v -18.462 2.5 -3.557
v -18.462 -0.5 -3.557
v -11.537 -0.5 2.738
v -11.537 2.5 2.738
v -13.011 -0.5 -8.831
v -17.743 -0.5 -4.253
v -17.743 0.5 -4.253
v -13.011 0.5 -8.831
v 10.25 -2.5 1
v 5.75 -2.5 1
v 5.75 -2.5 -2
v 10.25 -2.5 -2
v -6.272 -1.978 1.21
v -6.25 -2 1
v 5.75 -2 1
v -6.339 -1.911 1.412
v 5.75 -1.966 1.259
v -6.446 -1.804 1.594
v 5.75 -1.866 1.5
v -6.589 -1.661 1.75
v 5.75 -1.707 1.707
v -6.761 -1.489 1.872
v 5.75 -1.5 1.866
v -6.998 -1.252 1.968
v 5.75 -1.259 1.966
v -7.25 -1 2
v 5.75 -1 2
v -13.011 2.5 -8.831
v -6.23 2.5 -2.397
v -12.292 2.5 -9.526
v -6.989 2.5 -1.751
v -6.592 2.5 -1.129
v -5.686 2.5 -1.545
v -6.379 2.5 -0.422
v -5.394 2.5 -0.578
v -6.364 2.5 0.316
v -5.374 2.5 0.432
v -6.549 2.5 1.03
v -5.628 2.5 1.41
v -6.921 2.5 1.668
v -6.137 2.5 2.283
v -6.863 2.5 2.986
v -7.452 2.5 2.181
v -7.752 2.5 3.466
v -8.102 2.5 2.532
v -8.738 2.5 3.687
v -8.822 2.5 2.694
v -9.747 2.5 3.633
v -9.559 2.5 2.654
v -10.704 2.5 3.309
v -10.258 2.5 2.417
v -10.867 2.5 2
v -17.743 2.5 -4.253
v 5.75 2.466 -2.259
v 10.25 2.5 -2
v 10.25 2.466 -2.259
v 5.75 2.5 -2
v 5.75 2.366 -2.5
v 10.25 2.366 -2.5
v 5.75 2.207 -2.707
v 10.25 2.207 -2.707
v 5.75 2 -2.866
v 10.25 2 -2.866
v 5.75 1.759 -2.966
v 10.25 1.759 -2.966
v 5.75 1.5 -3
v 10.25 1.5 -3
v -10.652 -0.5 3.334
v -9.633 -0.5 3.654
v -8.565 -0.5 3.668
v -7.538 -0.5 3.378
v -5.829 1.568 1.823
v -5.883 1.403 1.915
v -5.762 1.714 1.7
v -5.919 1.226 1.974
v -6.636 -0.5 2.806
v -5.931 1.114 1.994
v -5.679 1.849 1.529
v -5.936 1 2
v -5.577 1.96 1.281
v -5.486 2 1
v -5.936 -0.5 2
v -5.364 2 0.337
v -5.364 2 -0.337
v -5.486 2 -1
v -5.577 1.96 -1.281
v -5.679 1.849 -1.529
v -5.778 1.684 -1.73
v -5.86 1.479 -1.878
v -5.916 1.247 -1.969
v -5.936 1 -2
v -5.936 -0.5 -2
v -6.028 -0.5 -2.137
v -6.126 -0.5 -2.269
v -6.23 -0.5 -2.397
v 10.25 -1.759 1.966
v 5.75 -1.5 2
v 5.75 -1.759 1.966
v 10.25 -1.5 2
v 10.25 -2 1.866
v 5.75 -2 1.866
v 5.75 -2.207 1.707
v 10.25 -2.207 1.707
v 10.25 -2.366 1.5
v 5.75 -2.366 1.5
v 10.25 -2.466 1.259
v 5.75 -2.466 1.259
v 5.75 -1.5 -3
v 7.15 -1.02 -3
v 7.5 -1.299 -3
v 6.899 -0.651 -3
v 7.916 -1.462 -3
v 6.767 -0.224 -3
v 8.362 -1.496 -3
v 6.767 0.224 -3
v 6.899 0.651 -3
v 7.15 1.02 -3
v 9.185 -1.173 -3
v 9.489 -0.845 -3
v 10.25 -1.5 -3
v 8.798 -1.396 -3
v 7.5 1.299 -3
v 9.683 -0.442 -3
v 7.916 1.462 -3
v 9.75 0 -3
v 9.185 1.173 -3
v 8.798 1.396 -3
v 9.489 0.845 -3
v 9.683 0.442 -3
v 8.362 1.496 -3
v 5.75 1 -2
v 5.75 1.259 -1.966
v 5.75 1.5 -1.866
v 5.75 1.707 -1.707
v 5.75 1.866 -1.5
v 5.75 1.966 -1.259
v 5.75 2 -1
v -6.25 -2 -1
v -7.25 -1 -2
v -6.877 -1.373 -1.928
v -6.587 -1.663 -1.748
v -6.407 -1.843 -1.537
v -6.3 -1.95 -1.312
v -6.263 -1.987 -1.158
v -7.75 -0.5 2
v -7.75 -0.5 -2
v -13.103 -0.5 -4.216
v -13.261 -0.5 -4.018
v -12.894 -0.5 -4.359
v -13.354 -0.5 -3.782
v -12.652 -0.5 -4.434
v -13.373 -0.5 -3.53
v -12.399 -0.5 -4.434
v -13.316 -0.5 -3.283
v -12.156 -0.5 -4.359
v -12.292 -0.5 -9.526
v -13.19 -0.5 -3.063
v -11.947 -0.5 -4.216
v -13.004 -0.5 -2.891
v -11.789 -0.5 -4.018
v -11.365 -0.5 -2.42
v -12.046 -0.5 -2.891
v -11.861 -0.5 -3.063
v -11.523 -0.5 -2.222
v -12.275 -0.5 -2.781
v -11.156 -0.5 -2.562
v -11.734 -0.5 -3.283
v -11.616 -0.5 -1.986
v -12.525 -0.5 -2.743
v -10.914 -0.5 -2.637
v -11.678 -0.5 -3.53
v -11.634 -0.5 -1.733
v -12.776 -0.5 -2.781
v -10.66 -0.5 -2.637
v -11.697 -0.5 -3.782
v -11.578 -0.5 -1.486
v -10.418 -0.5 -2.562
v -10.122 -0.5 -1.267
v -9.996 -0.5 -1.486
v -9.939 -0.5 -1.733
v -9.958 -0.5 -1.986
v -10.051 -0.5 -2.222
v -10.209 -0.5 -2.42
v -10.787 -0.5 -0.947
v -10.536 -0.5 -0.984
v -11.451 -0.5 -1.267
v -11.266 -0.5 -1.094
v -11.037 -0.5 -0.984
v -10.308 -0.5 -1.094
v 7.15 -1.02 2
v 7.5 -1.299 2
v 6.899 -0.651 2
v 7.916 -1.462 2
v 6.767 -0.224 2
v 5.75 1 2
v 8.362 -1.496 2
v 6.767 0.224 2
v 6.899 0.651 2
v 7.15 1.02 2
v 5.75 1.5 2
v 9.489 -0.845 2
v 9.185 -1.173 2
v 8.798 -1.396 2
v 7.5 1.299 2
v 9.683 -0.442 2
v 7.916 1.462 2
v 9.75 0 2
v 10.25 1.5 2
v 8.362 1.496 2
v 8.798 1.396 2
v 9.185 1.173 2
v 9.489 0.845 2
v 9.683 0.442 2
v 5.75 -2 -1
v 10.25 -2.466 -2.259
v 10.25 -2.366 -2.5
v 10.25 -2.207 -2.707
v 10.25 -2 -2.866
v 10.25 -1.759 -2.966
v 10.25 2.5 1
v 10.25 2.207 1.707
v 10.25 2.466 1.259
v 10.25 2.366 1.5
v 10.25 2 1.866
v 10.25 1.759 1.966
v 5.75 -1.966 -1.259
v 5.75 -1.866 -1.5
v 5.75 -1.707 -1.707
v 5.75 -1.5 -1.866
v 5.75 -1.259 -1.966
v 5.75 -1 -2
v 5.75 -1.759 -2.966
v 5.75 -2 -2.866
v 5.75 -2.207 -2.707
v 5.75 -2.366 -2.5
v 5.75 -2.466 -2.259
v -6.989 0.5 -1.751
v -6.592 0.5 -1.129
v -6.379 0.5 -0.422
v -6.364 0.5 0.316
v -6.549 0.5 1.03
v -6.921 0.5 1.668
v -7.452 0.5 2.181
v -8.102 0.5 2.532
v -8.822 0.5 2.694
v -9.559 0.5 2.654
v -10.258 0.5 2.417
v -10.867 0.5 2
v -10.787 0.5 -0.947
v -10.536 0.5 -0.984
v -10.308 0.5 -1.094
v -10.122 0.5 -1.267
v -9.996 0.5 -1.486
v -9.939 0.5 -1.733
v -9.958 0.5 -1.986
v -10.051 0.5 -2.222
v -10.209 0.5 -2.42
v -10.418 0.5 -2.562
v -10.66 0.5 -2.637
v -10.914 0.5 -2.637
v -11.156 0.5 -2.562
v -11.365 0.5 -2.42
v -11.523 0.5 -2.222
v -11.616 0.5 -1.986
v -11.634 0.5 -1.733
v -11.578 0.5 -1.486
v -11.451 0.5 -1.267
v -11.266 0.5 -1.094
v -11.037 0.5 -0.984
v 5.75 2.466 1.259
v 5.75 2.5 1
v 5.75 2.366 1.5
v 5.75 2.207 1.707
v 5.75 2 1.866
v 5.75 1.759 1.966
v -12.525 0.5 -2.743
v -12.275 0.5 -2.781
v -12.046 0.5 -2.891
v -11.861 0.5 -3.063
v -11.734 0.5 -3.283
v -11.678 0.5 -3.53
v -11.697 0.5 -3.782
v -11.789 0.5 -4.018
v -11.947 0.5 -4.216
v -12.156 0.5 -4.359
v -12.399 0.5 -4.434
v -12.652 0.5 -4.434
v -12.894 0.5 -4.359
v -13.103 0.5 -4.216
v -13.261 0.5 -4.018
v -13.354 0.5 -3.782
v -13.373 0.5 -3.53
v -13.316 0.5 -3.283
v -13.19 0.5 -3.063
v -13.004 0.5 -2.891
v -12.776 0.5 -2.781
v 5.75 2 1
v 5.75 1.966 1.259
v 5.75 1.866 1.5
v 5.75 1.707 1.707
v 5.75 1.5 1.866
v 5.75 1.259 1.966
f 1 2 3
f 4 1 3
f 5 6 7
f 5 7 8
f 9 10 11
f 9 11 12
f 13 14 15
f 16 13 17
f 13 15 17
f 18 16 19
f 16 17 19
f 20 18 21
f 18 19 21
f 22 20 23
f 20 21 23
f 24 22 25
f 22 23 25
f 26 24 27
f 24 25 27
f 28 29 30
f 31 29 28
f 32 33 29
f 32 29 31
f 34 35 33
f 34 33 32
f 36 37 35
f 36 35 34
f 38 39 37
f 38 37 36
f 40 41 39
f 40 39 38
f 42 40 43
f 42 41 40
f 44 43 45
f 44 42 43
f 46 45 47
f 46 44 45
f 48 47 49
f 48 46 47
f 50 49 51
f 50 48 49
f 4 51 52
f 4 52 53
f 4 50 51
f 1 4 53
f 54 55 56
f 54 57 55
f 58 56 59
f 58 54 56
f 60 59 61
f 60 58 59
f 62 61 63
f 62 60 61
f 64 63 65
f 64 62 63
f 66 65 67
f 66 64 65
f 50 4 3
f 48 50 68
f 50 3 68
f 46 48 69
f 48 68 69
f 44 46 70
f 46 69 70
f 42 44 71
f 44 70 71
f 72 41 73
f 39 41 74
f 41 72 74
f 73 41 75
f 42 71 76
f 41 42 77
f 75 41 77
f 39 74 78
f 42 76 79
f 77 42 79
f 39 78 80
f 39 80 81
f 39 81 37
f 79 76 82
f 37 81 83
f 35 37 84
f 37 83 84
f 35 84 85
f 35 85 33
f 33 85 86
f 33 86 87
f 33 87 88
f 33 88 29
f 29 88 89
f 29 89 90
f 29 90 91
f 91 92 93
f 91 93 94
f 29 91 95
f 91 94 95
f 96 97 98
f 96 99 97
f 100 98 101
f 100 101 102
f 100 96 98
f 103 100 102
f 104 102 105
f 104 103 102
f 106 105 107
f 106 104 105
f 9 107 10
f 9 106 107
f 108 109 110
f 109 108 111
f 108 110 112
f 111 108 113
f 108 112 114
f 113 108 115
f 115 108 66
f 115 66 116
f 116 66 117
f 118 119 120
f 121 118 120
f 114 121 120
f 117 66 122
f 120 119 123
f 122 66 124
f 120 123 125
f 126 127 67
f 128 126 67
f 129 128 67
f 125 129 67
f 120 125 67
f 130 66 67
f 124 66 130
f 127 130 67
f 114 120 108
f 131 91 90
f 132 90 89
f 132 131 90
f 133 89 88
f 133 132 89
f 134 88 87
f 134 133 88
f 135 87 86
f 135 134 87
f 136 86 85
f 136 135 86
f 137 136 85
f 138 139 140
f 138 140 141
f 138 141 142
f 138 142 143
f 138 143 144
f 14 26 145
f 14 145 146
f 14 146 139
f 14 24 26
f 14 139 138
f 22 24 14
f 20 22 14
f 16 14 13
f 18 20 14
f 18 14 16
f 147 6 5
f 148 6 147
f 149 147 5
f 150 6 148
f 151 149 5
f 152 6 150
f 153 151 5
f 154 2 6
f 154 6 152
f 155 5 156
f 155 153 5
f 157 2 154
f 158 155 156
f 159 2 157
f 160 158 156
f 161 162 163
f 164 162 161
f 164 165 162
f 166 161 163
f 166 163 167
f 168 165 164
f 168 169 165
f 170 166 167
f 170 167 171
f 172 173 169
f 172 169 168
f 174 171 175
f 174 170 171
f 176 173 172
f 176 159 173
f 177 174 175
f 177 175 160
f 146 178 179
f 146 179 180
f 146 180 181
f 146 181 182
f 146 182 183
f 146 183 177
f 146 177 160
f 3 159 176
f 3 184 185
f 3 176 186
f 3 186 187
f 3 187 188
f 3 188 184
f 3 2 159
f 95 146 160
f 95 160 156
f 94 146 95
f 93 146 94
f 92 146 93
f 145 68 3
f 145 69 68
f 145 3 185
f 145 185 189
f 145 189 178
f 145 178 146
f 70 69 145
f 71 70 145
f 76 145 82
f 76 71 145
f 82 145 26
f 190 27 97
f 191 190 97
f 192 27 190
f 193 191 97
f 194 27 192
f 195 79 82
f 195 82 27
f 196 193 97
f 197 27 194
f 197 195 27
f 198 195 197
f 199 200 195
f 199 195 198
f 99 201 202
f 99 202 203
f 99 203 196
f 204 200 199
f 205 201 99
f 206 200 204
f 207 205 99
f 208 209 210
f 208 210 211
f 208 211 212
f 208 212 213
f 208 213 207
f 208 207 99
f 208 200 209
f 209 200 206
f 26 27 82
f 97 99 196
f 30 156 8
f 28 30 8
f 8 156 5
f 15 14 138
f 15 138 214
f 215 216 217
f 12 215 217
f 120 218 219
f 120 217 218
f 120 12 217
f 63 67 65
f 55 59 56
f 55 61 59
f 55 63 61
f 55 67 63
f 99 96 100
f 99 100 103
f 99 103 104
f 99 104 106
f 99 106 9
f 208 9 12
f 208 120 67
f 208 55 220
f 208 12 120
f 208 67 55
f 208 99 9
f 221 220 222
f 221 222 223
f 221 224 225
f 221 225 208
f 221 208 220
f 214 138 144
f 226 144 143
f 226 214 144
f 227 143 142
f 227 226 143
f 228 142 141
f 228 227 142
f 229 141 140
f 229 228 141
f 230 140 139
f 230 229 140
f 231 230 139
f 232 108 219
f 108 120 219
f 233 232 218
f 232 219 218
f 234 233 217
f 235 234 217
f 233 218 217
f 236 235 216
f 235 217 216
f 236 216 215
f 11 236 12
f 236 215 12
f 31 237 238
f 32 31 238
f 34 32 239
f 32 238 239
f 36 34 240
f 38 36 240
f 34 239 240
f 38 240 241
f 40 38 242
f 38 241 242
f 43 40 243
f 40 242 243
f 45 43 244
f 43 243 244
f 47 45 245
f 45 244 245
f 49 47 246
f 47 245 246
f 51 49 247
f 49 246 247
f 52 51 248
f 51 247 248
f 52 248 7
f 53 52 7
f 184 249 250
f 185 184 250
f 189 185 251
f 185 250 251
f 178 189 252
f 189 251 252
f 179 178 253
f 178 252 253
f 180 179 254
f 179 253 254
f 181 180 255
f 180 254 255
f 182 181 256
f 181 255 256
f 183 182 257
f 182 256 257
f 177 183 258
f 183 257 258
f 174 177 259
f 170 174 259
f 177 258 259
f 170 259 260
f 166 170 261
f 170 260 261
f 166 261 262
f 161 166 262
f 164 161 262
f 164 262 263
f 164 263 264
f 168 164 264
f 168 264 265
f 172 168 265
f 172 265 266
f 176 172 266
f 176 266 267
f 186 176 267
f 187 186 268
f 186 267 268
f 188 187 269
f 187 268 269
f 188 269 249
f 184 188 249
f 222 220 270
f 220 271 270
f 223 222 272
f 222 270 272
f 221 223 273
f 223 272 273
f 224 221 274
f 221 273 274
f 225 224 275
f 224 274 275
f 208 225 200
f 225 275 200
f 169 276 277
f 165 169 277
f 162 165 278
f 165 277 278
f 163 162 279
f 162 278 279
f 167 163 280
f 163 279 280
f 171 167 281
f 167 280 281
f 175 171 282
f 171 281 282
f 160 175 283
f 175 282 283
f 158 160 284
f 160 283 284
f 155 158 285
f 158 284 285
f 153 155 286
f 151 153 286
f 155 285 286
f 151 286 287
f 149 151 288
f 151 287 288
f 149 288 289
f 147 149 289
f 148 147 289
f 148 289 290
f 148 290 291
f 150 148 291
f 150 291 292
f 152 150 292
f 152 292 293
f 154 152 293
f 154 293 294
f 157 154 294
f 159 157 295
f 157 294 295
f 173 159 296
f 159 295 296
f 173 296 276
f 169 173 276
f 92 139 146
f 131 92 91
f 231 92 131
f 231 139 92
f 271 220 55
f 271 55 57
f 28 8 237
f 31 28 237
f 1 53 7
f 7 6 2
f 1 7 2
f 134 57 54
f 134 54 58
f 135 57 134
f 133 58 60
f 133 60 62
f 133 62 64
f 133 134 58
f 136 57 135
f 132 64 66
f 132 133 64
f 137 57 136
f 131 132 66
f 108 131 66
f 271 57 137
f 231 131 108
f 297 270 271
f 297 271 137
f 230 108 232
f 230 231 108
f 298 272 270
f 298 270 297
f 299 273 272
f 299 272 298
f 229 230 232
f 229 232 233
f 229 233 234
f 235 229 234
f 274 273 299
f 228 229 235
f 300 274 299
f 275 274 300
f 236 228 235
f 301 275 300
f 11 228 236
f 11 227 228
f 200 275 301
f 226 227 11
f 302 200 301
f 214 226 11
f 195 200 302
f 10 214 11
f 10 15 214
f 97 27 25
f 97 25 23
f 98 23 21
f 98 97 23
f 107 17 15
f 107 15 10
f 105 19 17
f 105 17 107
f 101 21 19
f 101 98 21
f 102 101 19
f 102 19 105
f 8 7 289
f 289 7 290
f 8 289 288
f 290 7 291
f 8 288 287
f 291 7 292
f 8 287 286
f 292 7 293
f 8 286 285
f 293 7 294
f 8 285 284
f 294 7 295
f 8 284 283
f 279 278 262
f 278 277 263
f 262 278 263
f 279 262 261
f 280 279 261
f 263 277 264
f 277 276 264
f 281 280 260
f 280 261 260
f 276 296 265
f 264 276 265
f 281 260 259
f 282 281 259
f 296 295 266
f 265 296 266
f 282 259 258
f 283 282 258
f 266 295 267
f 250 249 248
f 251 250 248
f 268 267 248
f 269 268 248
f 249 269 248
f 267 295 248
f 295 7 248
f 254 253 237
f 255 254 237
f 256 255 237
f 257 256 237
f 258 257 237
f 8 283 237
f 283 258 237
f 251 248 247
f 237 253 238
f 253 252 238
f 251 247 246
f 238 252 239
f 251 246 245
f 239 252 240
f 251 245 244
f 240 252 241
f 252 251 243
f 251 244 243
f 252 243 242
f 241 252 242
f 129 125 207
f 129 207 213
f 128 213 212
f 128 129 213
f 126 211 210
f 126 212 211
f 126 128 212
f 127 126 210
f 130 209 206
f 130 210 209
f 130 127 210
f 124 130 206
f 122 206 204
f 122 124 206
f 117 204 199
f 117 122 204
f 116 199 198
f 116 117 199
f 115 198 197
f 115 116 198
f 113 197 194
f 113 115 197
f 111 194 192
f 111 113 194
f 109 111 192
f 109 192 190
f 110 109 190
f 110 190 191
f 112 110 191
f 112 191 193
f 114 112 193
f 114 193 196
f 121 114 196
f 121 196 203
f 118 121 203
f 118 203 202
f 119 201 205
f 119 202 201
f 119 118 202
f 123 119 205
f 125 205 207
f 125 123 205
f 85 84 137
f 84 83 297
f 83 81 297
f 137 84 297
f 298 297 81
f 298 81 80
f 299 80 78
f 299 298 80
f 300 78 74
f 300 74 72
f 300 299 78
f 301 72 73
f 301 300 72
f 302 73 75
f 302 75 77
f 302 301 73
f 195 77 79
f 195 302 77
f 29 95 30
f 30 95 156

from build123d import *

# Parameters (mm, degrees)
SKETCH_1_W                = 20.5
SKETCH_1_H                = 4
EXTRUDE_1_DEPTH           = 2
SKETCH_2_R                = 0.85
CUT_EXTRUDE_1_DEPTH       = 13
SKETCH_3_R                = 0.8
CUT_EXTRUDE_2_DEPTH       = 3
FILLET_1_R                = 1
SKETCH_4_W                = 4
SKETCH_4_H                = 4
CUT_EXTRUDE_5_DEPTH       = 1.5
CUT_EXTRUDE_6_DEPTH       = 1.5
SKETCH_7_W                = 1
SKETCH_7_H                = 4
EXTRUDE_2_DEPTH           = 1
FILLET_2_R                = 1
EXTRUDE_3_DEPTH           = 3
CUT_EXTRUDE_7_DEPTH       = 3
EXTRUDE_4_DEPTH           = 1
SKETCH_10_R               = 0.85
CUT_EXTRUDE_8_DEPTH       = 1
EXTRUDE_5_REACH           = 23.907
CUT_EXTRUDE_9_DEPTH       = 20.215826188
EXTRUDE_6_DEPTH           = 5
CUT_EXTRUDE_10_DEPTH      = 22.907341564
CUT_EXTRUDE_10_DEPTH_BACK = 22.907341564
SKETCH_14_R               = 1.5
FILLET_3_R                = 1


with BuildPart() as part:
    # 草图1 → 凸台-拉伸1 (new, symmetric)
    with BuildSketch(Plane.XY):
        Rectangle(SKETCH_1_W, SKETCH_1_H)
    extrude(amount=EXTRUDE_1_DEPTH, both=True)

    # 草图2 → 切除-拉伸1 (cut)
    with BuildSketch(Plane.XZ.offset(2)):
        with Locations(Location((-9.048459148, 0, 0), (0, 0, 270))):
            Circle(SKETCH_2_R)
    extrude(amount=-CUT_EXTRUDE_1_DEPTH, mode=Mode.SUBTRACT)

    # 草图3 → 切除-拉伸2 (cut)
    with BuildSketch(Plane.XY.offset(2)):
        with Locations((8.25, 0)):
            Circle(SKETCH_3_R)
    extrude(amount=-CUT_EXTRUDE_2_DEPTH, mode=Mode.SUBTRACT)

    # 圆角1
    fillet_1_edges = [part.edges().sort_by_distance(p)[0] for p in [
        (0, -2, 2),
        (0, -2, -2),
        (0, 2, -2),
        (0, 2, 2),
    ]]
    fillet(fillet_1_edges, radius=FILLET_1_R)

    # 草图4 → 切除-拉伸5 (cut)
    with BuildSketch(Plane.XZ.offset(2)):
        with Locations((-8.25, 0)):
            Rectangle(SKETCH_4_W, SKETCH_4_H)
    extrude(amount=-CUT_EXTRUDE_5_DEPTH, mode=Mode.SUBTRACT)

    # 草图5 → 切除-拉伸6 (cut)
    with BuildSketch(Plane(origin=(0, 2, 0), x_dir=(1, 0, 0), z_dir=(0, 1, 0))):
        Polygon((-6.25, 0), (-6.25, 2), (-10.25, 2), (-10.25, -2), (-6.25, -2), align=None)
    extrude(amount=-CUT_EXTRUDE_6_DEPTH, mode=Mode.SUBTRACT)

    # 草图7 → 凸台-拉伸2 (add)
    with BuildSketch(Plane.XZ.offset(0.5)):
        with Locations((-10.75, 0)):
            Rectangle(SKETCH_7_W, SKETCH_7_H)
    extrude(amount=-EXTRUDE_2_DEPTH)

    # 圆角2
    fillet_2_edges = [part.edges().sort_by_distance(p)[0] for p in [
        (-11.25, 0, 2),
        (-11.25, 0, -2),
    ]]
    fillet(fillet_2_edges, radius=FILLET_2_R)

    # 草图8 → 凸台-拉伸3 (add)
    with BuildSketch(Plane.XZ.offset(0.5)):
        with BuildLine():
            Line((-13.011033862, -8.830832343), (-6.991216755, -1.748643399))
            ThreePointArc((-6.991216755, -1.748643399), (-7.171159983, 1.940553489), (-10.864293035, 1.998186001))
            Line((-10.864293035, 1.998186001), (-17.742872996, -4.252662808))
            Line((-17.742872996, -4.252662808), (-18.461553282, -3.557322138))
            Line((-18.461553282, -3.557322138), (-11.537428317, 2.737705696))
            ThreePointArc((-11.537428317, 2.737705696), (-6.475862877, 2.659275921), (-6.229806023, -2.396913549))
            Line((-6.229806023, -2.396913549), (-12.292353576, -9.526173013))
            Line((-12.292353576, -9.526173013), (-13.011033862, -8.830832343))
        make_face()
    extrude(amount=-EXTRUDE_3_DEPTH)

    # 草图9 → 切除-拉伸7 (cut)
    with BuildSketch(Plane.XZ.offset(0.5)):
        with BuildLine():
            Line((-13.011033862, -8.830832343), (-6.989420262, -1.751365983))
            ThreePointArc((-6.989420262, -1.751365983), (-7.168982159, 1.942804723), (-10.867073667, 1.999891291))
            Line((-10.867073667, 1.999891291), (-17.742872996, -4.252662808))
            Line((-17.742872996, -4.252662808), (-13.011033862, -8.830832343))
        make_face()
    extrude(amount=-CUT_EXTRUDE_7_DEPTH, mode=Mode.SUBTRACT)

    # 草图9<2> → 凸台-拉伸4 (add)
    with BuildSketch(Plane.XZ.offset(0.5)):
        with BuildLine():
            Line((-13.011033862, -8.830832343), (-6.989420262, -1.751365983))
            ThreePointArc((-6.989420262, -1.751365983), (-7.168982159, 1.942804723), (-10.867073667, 1.999891291))
            Line((-10.867073667, 1.999891291), (-17.742872996, -4.252662808))
            Line((-17.742872996, -4.252662808), (-13.011033862, -8.830832343))
        make_face()
    extrude(amount=-EXTRUDE_4_DEPTH)

    # 草图10 → 切除-拉伸8 (cut)
    with BuildSketch(Plane(origin=(0, 0.5, 0), x_dir=(1, 0, 0), z_dir=(0, 1, 0))):
        with Locations(Location((-10.786836392, 1.796675975, 0), (0, 0, 270))):
            Circle(SKETCH_10_R)
        with Locations(Location((-12.525213635, 3.59335195, 0), (0, 0, 270))):
            Circle(SKETCH_10_R)
    extrude(amount=-CUT_EXTRUDE_8_DEPTH, mode=Mode.SUBTRACT)

    # 凸台-拉伸5: up to this face of the body (flat: up to its plane)
    extrude_5_end = Plane(part.part.faces().sort_by_distance((2.117336662, -0.003624728, -2))[0])
    # 草图11 → 凸台-拉伸5 (add, up to the picked face)
    with BuildSketch(Plane.XY.offset(2), mode=Mode.PRIVATE) as extrude_5_sk1:
        Polygon((-6.25, -2), (-6.25, -0.5), (-7.75, -0.5), align=None)
    extrude_5_tool1 = split(extrude(extrude_5_sk1.sketch, amount=-EXTRUDE_5_REACH, mode=Mode.PRIVATE), bisect_by=extrude_5_end, keep=Keep.BOTH, mode=Mode.PRIVATE)
    add(extrude_5_tool1.solids().sort_by(Axis((-6.75, -1, 2), (0, 0, -1)))[0])

    # 草图12 → 切除-拉伸9 (cut, through all)
    with BuildSketch(Plane(origin=(-6.25, 0, 0), x_dir=(0, 0, -1), z_dir=(1, 0, 0))):
        with BuildLine():
            Line((2, -1), (2, -2))
            Line((2, -2), (1, -2))
            ThreePointArc((1, -2), (1.707106781, -1.707106781), (2, -1))
        make_face()
        with BuildLine():
            Line((-1, -2), (-2, -2))
            Line((-2, -2), (-2, -1))
            ThreePointArc((-2, -1), (-1.707106781, -1.707106781), (-1, -2))
        make_face()
    extrude(amount=-CUT_EXTRUDE_9_DEPTH, mode=Mode.SUBTRACT)

    # 草图13 → 凸台-拉伸6 (add)
    with BuildSketch(Plane.XY.offset(2)):
        Polygon((10.25, -2), (10.25, 2.5), (5.75, 2.5), (5.75, -2.5), (10.25, -2.5), align=None)
    extrude(amount=-EXTRUDE_6_DEPTH)

    # 草图14 → 切除-拉伸10 (cut, two sides: drawn at the far end of the back side and taken through both)
    with BuildSketch(Plane.XY.offset(2).offset(-CUT_EXTRUDE_10_DEPTH_BACK)):
        with Locations((8.25, 0)):
            Circle(SKETCH_14_R)
    extrude(amount=CUT_EXTRUDE_10_DEPTH + CUT_EXTRUDE_10_DEPTH_BACK, mode=Mode.SUBTRACT)

    # 圆角3
    fillet_3_edges = [part.edges().sort_by_distance(p)[0] for p in [
        (8, 2.5, 2),
        (8, -2.5, 2),
        (8, 2.5, -3),
        (8, -2.5, -3),
    ]]
    fillet(fillet_3_edges, radius=FILLET_3_R)


solid = part.part
